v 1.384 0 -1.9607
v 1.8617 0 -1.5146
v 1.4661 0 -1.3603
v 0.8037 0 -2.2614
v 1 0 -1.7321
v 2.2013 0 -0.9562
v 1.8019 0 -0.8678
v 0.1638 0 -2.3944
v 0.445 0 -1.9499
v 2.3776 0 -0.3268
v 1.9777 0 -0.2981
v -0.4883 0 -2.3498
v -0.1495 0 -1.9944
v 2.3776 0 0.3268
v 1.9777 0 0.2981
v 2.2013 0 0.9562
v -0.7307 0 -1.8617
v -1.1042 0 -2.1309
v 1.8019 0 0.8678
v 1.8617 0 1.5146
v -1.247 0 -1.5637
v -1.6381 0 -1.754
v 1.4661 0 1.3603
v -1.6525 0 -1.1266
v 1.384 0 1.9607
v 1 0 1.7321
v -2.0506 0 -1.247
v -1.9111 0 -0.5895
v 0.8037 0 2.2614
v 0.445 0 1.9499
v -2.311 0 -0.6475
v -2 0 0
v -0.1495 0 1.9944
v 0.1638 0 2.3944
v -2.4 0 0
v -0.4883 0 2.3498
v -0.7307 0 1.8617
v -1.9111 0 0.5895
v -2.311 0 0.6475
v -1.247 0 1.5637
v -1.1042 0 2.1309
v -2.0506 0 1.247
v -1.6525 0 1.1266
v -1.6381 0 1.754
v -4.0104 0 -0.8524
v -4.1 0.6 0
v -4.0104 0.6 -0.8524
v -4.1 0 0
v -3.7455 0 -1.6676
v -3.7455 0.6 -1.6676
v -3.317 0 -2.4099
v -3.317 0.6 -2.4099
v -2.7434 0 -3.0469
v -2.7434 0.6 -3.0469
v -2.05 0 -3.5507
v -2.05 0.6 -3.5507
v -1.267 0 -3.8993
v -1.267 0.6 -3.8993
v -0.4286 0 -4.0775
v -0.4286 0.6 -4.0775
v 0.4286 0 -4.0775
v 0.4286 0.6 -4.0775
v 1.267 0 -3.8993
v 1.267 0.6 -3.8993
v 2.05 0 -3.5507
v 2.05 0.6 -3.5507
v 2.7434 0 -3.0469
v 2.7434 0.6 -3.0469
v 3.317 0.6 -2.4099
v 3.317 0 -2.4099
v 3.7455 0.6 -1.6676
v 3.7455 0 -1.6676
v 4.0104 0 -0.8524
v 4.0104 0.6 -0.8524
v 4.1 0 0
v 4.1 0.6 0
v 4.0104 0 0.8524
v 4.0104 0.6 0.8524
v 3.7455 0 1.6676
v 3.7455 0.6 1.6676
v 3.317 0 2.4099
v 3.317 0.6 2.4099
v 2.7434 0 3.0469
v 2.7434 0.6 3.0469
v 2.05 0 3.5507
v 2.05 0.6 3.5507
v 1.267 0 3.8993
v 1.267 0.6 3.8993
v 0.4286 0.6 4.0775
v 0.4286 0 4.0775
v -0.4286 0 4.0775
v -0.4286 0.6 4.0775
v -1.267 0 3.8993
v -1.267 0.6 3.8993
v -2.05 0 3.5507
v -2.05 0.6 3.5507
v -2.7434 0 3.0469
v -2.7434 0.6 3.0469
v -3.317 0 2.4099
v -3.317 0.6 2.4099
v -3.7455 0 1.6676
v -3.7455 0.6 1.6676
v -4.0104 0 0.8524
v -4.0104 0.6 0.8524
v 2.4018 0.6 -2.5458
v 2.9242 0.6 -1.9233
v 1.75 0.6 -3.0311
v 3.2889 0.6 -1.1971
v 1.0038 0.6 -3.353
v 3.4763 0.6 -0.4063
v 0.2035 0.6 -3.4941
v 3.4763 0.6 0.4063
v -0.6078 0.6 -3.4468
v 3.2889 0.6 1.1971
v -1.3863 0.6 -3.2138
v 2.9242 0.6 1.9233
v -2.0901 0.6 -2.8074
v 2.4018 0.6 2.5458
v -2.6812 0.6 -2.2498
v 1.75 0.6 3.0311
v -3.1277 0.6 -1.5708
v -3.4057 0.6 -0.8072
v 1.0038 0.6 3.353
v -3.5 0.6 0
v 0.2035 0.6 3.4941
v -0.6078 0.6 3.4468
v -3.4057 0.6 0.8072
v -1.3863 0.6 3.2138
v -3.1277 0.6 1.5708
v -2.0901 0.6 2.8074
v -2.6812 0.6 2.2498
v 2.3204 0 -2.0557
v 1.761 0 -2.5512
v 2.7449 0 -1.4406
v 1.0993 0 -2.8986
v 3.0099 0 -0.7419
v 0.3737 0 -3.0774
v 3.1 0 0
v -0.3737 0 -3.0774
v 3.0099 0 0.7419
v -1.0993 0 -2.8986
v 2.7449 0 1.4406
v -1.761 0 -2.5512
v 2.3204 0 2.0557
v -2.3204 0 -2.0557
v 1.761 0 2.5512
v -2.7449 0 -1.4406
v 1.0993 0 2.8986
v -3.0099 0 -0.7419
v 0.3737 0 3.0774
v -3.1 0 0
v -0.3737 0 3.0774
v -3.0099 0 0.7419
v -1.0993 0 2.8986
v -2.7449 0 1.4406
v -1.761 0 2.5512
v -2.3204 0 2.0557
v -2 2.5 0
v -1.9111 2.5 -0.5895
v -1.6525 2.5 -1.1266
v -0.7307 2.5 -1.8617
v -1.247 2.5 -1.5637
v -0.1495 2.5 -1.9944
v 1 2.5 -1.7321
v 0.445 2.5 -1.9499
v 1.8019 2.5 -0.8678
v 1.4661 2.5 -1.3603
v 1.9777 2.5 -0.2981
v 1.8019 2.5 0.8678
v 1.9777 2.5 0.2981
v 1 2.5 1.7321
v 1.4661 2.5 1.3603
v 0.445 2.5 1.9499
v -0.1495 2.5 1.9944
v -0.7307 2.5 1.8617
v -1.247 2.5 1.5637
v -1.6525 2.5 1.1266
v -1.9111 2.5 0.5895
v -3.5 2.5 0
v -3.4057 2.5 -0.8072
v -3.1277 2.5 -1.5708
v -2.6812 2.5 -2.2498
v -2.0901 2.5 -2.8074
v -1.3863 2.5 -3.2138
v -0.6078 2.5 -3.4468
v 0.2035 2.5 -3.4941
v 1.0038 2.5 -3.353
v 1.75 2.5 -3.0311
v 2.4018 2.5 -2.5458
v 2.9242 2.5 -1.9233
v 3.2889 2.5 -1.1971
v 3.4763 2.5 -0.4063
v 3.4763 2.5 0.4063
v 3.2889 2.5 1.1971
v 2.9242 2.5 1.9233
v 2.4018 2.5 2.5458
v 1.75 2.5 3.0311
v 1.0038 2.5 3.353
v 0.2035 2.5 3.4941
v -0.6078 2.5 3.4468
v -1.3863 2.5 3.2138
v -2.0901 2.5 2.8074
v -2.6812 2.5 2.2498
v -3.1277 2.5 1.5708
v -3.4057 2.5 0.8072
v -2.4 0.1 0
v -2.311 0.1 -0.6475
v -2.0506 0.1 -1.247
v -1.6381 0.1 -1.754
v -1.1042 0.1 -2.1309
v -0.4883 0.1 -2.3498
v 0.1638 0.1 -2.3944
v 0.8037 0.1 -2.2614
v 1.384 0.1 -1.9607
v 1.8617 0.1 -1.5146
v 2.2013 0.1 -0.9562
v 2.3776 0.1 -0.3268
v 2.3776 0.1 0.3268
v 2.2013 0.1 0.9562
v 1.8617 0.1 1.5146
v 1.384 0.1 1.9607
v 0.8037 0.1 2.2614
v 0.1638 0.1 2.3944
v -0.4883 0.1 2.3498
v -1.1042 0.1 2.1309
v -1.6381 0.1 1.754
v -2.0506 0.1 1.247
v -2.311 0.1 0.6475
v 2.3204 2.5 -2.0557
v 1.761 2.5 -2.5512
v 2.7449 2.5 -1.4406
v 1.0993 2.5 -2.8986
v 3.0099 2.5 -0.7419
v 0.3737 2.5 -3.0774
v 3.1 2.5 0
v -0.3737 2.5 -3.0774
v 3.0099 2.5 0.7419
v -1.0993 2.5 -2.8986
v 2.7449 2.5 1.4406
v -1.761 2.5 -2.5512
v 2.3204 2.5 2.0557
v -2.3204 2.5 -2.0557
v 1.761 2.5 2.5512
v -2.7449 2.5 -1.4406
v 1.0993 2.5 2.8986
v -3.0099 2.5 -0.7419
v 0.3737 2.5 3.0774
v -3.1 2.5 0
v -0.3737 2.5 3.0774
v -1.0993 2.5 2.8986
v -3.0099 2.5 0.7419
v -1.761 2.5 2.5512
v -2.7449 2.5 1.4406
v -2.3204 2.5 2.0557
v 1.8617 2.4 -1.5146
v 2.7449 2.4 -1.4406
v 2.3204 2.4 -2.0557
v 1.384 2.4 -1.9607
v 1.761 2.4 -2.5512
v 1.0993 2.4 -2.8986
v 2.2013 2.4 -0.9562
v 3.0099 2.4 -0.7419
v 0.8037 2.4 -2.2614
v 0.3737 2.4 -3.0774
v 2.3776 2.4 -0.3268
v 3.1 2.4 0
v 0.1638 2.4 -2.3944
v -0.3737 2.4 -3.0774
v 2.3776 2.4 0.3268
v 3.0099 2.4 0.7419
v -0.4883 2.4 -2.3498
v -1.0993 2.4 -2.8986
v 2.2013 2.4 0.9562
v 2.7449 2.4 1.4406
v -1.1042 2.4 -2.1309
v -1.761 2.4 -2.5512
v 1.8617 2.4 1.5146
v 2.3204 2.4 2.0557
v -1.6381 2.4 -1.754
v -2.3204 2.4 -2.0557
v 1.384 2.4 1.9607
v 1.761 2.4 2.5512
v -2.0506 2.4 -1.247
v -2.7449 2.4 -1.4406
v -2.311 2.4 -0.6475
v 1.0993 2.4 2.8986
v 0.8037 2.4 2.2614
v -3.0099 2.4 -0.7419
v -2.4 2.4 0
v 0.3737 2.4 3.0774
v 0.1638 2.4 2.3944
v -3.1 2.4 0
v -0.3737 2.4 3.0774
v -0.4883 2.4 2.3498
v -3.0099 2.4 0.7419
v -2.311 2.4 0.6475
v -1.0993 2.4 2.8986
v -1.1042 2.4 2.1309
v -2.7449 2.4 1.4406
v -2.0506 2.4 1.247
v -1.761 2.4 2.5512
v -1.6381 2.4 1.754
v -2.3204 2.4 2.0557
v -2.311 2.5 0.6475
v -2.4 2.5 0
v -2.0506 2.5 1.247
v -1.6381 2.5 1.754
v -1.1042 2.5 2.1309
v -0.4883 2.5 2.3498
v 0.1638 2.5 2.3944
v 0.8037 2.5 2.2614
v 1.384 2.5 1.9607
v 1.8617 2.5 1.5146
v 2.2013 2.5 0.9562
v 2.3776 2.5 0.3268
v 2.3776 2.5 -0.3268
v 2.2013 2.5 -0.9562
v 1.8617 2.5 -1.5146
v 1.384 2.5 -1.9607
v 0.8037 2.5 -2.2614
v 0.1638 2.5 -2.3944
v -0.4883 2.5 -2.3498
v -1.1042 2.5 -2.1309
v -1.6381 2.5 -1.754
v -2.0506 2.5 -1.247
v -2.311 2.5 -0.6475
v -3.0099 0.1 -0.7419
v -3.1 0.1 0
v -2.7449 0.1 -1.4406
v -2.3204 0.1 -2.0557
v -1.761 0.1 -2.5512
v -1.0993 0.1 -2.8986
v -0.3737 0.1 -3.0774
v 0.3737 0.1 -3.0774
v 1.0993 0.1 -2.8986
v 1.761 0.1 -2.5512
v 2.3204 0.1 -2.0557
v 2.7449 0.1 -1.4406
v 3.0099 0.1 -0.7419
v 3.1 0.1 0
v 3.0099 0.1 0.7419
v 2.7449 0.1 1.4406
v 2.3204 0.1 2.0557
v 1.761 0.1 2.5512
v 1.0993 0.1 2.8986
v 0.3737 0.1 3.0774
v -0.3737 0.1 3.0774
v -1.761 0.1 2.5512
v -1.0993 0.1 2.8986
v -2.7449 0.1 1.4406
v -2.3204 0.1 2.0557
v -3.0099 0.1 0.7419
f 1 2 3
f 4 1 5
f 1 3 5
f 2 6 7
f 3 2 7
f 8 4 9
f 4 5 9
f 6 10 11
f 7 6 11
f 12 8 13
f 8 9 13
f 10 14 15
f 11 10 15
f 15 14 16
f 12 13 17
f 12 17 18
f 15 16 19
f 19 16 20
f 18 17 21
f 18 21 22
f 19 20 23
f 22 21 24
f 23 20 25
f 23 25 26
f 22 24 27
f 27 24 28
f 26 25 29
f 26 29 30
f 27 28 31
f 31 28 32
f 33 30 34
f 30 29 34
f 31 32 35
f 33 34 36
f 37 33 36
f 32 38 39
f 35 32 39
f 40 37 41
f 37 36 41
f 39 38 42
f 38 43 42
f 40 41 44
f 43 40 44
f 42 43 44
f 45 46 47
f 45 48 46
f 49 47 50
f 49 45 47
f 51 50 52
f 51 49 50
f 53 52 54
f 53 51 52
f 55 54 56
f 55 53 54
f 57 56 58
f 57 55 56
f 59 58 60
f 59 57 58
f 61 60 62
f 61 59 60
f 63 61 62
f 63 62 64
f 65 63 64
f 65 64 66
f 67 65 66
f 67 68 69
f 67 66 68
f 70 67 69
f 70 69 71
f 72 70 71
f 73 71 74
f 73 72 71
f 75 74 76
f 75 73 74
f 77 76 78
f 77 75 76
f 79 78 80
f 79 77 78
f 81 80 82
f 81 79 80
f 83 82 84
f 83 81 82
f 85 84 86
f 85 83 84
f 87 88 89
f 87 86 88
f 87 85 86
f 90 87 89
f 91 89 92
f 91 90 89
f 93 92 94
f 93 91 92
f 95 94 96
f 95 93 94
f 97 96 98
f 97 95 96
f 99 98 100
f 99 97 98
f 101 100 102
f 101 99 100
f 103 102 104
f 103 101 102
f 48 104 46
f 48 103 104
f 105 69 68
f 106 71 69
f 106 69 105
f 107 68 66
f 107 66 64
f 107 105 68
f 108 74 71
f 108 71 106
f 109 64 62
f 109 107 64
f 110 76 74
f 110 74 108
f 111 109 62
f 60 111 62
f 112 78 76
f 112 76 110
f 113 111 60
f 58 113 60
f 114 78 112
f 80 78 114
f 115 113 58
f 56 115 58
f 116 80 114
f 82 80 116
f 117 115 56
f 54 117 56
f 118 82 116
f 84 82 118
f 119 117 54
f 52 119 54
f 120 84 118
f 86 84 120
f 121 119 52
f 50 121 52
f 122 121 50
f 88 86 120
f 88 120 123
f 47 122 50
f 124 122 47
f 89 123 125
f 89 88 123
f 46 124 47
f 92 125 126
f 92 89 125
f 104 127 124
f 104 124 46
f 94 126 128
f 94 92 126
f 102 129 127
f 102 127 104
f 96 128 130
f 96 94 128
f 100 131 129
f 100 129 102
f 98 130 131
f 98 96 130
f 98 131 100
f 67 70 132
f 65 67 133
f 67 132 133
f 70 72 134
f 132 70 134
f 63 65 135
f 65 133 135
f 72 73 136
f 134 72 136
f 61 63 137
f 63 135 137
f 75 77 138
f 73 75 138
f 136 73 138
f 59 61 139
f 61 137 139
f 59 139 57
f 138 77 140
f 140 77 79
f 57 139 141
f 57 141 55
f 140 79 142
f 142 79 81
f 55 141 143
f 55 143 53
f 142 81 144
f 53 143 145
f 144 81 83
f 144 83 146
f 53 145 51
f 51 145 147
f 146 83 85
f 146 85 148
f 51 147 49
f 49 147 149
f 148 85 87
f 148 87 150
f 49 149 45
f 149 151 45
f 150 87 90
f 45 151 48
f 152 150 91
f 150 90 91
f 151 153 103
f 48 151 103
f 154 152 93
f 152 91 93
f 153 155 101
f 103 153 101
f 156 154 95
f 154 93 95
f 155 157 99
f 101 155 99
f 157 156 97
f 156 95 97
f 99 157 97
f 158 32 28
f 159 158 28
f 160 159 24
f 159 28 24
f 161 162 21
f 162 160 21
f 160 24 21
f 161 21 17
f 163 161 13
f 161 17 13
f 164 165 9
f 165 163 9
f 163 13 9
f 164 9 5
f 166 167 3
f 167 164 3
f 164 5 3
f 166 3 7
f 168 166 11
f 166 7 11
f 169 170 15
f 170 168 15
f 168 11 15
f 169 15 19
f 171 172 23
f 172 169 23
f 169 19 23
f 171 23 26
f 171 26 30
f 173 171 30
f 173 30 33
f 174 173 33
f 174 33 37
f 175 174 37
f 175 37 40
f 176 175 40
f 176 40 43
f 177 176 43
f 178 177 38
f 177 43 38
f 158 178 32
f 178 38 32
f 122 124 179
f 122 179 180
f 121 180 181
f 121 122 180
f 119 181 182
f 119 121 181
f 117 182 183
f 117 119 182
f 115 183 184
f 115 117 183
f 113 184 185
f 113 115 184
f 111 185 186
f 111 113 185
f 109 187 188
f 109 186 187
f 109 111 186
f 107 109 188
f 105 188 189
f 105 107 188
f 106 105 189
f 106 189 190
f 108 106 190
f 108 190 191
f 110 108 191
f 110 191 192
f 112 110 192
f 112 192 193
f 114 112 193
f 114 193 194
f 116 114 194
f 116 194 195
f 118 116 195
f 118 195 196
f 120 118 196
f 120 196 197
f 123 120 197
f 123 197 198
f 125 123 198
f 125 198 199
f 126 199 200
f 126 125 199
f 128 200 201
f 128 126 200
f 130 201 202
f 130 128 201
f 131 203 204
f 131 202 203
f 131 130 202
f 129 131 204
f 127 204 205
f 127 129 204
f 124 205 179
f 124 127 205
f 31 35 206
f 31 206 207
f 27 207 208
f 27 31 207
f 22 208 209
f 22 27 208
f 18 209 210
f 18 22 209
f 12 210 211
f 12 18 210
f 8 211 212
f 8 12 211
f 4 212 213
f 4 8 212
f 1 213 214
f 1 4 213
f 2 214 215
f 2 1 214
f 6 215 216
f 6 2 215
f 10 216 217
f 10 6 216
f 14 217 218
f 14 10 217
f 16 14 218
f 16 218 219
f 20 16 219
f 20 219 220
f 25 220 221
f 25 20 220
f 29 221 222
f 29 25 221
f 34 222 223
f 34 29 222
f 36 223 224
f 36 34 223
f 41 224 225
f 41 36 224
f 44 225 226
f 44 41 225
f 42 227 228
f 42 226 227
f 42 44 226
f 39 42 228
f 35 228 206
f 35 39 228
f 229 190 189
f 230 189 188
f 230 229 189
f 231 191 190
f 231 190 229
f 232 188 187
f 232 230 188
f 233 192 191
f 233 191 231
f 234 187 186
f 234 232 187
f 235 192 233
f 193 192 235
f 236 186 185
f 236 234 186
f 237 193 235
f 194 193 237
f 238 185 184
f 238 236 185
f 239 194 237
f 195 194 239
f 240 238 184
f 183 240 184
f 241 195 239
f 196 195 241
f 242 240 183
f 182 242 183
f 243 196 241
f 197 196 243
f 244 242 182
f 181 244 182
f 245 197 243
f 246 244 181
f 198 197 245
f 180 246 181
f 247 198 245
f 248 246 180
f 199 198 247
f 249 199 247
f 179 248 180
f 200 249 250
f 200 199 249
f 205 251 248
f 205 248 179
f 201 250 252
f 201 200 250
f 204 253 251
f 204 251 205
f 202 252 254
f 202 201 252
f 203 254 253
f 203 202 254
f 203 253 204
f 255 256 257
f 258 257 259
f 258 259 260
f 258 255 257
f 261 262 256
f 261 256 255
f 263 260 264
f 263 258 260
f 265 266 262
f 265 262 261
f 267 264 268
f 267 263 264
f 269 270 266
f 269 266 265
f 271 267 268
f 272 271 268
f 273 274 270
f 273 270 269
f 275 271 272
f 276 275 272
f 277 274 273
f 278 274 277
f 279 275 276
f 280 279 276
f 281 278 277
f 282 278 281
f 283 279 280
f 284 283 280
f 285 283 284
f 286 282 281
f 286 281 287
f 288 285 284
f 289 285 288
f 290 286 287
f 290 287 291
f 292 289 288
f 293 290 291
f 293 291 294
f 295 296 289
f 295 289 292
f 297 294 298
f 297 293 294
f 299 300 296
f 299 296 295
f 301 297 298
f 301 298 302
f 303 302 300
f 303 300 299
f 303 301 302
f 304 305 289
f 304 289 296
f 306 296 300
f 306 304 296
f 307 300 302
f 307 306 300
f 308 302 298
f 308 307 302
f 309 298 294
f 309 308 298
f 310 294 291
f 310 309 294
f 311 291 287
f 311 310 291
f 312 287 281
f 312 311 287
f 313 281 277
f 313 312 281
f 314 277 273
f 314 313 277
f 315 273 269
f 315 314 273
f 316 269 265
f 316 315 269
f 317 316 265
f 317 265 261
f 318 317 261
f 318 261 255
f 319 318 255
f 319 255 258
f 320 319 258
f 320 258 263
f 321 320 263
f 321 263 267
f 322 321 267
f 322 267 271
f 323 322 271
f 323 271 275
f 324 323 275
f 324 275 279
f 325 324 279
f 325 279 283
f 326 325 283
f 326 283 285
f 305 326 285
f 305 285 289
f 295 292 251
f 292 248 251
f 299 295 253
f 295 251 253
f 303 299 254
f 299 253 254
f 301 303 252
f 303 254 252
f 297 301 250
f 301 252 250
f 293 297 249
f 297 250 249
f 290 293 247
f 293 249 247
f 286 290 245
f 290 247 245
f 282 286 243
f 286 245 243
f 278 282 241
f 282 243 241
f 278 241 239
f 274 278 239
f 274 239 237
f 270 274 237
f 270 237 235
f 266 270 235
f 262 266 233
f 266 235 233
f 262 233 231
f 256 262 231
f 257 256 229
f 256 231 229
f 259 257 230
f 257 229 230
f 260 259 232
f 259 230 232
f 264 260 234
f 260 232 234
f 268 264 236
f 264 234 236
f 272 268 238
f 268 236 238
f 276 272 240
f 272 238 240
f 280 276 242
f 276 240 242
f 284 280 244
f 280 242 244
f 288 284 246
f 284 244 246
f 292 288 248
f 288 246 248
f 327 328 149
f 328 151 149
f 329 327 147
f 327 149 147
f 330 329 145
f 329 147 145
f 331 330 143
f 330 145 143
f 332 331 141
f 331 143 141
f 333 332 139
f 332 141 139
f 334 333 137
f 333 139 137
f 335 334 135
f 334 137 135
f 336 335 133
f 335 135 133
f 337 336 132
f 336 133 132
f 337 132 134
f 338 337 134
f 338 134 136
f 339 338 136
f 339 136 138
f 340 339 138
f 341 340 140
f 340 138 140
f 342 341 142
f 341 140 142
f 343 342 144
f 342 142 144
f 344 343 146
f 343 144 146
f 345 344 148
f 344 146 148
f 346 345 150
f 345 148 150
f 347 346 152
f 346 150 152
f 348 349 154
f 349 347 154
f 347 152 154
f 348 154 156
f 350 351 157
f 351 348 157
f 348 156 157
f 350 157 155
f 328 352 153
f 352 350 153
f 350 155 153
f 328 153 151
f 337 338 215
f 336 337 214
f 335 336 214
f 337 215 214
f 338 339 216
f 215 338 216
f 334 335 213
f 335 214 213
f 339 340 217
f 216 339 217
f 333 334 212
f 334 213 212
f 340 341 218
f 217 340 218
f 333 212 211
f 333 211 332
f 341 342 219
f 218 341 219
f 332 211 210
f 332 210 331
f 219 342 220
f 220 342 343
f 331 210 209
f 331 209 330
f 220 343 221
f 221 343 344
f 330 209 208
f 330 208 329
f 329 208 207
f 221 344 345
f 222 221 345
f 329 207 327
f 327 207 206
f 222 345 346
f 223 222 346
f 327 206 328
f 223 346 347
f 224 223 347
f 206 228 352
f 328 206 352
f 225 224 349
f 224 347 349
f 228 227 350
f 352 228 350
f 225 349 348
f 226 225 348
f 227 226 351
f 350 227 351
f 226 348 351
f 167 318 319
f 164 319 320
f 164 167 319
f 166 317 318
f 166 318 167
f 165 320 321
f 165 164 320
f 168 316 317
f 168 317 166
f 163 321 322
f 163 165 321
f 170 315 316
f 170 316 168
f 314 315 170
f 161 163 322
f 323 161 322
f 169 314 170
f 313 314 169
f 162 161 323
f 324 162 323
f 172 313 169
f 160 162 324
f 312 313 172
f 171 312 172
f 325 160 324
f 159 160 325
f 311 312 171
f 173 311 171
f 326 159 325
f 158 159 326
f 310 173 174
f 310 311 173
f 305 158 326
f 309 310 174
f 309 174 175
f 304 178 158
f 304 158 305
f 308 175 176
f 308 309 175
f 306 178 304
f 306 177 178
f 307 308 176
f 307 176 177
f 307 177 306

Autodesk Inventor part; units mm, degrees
ref_plane "YZ Plane" through (0, 0, 0) normal (1, 0, 0) x (0, 1, 0)
ref_plane "XZ Plane" through (0, 0, 0) normal (0, 1, 0) x (-1, 0, 0)
ref_plane "XY Plane" through (0, 0, 0) normal (0, 0, 1) x (1, 0, 0)
sketch "Sketch1" plane through (0, 0, 0) normal (0, 1, 0) x (-1, 0, 0)
  circle A0 centre (0, 0) radius 3.5
  circle A1 centre (0, 0) radius 2
  circle A2 centre (0, 0) radius 4.1
  circle A3 centre (0, 0) radius 2.4
  circle A4 centre (0, 0) radius 3.1
  dimension "d0" = 7
  dimension "d1" = 4
  dimension "d2" = 8.2
  dimension "d3" = 0.4
  dimension "d4" = 0.4
extrude "Extrusion1" add sketch "Sketch1" along normal blind 2.5 contours A0 | A3 | A4
extrude "Extrusion2" add sketch "Sketch1" along normal blind 0.6 contours A2
extrude "Extrusion3" cut sketch "Sketch1" along normal blind 0.1 contours A4
extrude "Extrusion4" cut sketch "Sketch1" against normal blind 0.1 from surface at 2.5 contours A4
properties part number "Miniatur Flanschkugellager MF 74 ZZ"
